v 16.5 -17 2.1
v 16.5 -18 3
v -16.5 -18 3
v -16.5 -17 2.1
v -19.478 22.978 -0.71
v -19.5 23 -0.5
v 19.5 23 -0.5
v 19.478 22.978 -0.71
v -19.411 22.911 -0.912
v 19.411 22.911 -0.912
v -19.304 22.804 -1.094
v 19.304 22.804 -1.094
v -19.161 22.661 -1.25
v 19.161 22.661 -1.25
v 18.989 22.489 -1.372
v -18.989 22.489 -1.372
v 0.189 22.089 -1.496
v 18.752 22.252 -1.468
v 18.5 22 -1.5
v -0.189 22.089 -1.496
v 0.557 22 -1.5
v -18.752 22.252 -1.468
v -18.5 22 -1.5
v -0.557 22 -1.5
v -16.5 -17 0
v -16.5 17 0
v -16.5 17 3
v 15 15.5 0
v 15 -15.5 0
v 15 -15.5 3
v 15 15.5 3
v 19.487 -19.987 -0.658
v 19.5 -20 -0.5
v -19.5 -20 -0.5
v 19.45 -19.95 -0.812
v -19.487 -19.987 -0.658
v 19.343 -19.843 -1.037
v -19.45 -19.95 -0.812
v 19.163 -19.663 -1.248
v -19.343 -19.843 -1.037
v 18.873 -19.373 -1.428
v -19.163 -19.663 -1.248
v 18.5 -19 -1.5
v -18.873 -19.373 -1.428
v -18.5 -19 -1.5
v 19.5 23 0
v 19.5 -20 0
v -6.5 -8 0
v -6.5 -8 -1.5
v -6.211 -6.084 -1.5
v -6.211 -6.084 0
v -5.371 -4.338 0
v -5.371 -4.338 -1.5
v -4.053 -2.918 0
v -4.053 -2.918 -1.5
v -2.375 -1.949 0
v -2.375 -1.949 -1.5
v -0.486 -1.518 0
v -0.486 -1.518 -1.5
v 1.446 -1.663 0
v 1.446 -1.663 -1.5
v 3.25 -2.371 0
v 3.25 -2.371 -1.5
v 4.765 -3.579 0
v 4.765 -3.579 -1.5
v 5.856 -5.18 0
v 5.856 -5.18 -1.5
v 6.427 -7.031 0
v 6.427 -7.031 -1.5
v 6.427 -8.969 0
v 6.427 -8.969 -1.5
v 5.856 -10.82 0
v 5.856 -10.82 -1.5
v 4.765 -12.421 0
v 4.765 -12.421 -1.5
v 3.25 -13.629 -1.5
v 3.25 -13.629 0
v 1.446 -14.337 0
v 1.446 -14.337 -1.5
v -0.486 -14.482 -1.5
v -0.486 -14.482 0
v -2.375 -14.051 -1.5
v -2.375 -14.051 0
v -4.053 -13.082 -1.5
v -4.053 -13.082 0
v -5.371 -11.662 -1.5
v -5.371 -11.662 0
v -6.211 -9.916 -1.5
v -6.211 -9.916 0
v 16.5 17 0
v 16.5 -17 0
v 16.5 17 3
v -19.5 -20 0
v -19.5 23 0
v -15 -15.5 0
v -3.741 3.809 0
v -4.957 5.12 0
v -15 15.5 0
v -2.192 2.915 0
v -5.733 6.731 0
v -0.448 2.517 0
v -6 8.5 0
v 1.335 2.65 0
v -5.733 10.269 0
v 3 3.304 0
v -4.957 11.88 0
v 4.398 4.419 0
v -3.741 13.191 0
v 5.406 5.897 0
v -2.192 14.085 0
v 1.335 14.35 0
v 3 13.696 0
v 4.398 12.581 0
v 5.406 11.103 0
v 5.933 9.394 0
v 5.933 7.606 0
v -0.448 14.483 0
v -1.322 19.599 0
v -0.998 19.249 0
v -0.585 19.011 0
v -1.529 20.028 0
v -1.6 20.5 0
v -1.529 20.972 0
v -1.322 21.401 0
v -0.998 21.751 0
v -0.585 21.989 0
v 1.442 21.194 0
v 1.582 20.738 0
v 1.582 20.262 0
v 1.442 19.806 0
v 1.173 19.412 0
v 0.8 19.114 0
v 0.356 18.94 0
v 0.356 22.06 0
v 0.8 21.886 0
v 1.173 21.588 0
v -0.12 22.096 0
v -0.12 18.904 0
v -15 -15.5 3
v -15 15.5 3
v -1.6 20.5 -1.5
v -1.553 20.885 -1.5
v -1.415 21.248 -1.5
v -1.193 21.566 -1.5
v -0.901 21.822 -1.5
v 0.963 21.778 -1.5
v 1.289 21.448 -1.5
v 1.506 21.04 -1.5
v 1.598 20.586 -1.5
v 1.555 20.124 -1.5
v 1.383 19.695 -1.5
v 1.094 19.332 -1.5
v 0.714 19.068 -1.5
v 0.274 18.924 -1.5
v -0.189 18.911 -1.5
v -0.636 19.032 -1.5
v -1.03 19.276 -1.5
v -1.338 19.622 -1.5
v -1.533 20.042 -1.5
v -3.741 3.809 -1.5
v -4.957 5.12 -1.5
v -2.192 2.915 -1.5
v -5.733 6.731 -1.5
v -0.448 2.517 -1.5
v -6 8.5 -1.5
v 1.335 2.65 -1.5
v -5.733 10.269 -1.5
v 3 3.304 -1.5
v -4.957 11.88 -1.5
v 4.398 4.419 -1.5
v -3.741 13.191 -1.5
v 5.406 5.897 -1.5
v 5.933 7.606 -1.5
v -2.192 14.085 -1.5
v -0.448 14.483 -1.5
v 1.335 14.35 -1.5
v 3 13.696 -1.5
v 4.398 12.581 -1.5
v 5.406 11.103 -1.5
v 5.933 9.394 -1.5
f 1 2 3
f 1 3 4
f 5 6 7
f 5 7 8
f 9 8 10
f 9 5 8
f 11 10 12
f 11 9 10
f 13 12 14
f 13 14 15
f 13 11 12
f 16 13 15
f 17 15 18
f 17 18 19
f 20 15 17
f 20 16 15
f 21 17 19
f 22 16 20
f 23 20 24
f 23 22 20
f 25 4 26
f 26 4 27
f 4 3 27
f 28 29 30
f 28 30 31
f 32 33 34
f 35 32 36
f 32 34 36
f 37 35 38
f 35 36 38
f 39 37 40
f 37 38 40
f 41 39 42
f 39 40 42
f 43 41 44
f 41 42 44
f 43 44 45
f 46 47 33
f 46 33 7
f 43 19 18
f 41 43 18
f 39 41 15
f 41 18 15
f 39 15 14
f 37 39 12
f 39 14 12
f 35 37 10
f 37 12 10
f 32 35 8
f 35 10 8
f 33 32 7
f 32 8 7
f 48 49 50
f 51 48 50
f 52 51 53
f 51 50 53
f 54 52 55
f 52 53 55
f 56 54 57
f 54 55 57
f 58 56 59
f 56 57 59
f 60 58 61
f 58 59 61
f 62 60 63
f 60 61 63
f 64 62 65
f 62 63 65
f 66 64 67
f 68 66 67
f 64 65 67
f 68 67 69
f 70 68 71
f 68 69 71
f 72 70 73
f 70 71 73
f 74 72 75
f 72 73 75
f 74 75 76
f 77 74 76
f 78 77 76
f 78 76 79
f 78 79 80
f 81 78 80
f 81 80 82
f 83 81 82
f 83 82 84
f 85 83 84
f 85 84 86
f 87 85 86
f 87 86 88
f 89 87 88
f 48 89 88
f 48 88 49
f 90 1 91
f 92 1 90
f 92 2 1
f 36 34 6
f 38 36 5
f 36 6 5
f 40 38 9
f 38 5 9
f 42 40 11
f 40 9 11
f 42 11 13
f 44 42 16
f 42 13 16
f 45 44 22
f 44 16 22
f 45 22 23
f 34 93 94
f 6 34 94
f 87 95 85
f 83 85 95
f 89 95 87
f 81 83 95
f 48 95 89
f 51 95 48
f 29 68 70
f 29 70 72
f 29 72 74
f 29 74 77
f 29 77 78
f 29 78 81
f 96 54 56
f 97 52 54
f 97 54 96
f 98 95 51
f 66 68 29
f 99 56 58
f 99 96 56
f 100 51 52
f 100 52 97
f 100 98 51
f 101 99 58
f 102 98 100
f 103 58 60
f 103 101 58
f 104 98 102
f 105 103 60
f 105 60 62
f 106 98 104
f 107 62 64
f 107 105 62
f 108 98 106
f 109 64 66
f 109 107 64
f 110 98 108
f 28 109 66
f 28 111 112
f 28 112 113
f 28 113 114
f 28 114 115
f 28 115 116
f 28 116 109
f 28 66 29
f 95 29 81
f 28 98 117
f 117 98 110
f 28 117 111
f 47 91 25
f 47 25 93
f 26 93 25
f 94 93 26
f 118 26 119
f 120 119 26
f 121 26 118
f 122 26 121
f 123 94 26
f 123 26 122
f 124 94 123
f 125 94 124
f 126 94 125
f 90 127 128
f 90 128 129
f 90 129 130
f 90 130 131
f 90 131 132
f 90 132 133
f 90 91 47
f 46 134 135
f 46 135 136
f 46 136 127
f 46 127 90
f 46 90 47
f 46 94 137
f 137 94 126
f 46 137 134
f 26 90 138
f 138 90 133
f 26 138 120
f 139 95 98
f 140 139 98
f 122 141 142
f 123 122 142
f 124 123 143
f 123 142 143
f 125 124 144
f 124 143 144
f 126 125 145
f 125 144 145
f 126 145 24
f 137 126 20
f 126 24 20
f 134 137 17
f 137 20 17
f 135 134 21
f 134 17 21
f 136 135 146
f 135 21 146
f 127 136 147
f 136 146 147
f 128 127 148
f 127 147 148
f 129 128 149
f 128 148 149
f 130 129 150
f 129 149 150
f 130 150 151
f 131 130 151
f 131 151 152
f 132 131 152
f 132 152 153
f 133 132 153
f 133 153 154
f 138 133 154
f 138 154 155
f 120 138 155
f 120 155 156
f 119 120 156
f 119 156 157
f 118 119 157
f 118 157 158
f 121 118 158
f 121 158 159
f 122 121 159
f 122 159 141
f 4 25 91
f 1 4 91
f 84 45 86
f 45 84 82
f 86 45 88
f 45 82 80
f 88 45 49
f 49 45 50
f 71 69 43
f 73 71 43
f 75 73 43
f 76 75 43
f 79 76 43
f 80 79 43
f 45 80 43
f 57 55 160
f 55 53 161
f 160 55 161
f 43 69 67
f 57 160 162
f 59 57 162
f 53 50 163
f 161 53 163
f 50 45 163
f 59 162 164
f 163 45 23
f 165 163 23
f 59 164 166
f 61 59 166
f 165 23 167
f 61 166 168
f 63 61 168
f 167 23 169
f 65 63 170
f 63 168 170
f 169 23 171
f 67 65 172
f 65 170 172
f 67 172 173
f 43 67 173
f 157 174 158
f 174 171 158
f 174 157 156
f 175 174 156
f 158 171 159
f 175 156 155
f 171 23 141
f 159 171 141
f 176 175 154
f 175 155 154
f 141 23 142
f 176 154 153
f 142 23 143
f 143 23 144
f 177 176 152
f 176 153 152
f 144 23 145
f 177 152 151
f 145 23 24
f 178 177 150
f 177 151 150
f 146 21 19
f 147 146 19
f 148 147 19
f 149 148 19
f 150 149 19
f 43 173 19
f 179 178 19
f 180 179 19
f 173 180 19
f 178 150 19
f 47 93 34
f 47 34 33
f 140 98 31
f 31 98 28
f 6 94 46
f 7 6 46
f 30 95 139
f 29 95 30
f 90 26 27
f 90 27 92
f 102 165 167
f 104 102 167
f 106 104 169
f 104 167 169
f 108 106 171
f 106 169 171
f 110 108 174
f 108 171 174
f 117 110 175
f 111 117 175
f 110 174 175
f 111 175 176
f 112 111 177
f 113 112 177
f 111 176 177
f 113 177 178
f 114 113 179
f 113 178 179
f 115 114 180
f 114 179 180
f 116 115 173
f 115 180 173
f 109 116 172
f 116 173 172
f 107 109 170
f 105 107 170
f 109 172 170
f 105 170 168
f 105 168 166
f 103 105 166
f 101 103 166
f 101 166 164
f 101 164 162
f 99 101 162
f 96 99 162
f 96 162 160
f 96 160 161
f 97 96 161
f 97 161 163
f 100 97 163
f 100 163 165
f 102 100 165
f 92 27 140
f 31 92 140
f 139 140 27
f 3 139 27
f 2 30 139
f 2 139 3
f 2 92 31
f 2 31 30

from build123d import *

# Parameters (mm, degrees)
F0_W        = 33
F0_H        = 34
F0_W_2      = 30
F0_H_2      = 31
F1_DEPTH    = 3
F2_W        = 39
F2_H        = 43
F3_DEPTH    = 1.5
F4_D        = 3.2
F5_T1_DEPTH = 44
F5_T3_DEPTH = 48
F7_DEPTH    = 16.5
F8_D        = 12
F9_D        = 13


# Not quite as in the source:
# - a fillet or chamfer that OpenCascade refuses, or shapes differently, is made with other operations: its cross-section is extruded or revolved along the edge and cut away or added


with BuildPart() as f1:
    # F0 (on Top) → F1 (new body)
    with BuildSketch(Plane.XY):
        Rectangle(F0_W, F0_H)
        Rectangle(F0_W_2, F0_H_2, mode=Mode.SUBTRACT)
    extrude(amount=F1_DEPTH)

    # F2 (on Top) → F3 (join)
    with BuildSketch(Plane.XY):
        with Locations((0, 1.5)):
            Rectangle(F2_W, F2_H)
    extrude(amount=-F3_DEPTH)

    # F4 (through all)
    with Locations(Plane.XY):
        with Locations((0, 20.5)):
            Hole(F4_D / 2)

    # F5: fillet of radius 1 on 4 edges, made by hand

    # F5_s2 → F5_t1 (cut)
    with BuildSketch(Plane.YZ.offset(-22)):
        with BuildLine():
            ThreePointArc((23, -0.5), (22.7071067812, -1.2071067812), (22, -1.5))
            Line((22, -1.5), (23, -1.5))
            Line((23, -1.5), (23, -0.5))
        make_face()
        with BuildLine():
            ThreePointArc((-20, -0.5), (-19.7071067812, -1.2071067812), (-19, -1.5))
            Line((-19, -1.5), (-20, -1.5))
            Line((-20, -1.5), (-20, -0.5))
        make_face()
    extrude(amount=F5_T1_DEPTH, mode=Mode.SUBTRACT)

    # F5_s4 → F5_t3 (cut)
    with BuildSketch(Plane.XZ.offset(-25.5)):
        with BuildLine():
            ThreePointArc((-19.5, -0.5), (-19.2071067812, -1.2071067812), (-18.5, -1.5))
            Line((-18.5, -1.5), (-19.5, -1.5))
            Line((-19.5, -1.5), (-19.5, -0.5))
        make_face()
        with BuildLine():
            ThreePointArc((18.5, -1.5), (19.2071067812, -1.2071067812), (19.5, -0.5))
            Line((19.5, -0.5), (19.5, -1.5))
            Line((19.5, -1.5), (18.5, -1.5))
        make_face()
    extrude(amount=F5_T3_DEPTH, mode=Mode.SUBTRACT)

    # F6 (on Right) → F7 (join, symmetric)
    with BuildSketch(Plane.YZ):
        Polygon((-17, 3), (-18, 3), (-17, 2.1), align=None)
    extrude(amount=F7_DEPTH, both=True)

    # F8 (through all)
    with Locations(Plane.XY):
        with Locations((0, 8.5)):
            Hole(F8_D / 2)

    # F9 (through all)
    with Locations(Plane.XY):
        with Locations((0, -8)):
            Hole(F9_D / 2)


solid = f1.part
